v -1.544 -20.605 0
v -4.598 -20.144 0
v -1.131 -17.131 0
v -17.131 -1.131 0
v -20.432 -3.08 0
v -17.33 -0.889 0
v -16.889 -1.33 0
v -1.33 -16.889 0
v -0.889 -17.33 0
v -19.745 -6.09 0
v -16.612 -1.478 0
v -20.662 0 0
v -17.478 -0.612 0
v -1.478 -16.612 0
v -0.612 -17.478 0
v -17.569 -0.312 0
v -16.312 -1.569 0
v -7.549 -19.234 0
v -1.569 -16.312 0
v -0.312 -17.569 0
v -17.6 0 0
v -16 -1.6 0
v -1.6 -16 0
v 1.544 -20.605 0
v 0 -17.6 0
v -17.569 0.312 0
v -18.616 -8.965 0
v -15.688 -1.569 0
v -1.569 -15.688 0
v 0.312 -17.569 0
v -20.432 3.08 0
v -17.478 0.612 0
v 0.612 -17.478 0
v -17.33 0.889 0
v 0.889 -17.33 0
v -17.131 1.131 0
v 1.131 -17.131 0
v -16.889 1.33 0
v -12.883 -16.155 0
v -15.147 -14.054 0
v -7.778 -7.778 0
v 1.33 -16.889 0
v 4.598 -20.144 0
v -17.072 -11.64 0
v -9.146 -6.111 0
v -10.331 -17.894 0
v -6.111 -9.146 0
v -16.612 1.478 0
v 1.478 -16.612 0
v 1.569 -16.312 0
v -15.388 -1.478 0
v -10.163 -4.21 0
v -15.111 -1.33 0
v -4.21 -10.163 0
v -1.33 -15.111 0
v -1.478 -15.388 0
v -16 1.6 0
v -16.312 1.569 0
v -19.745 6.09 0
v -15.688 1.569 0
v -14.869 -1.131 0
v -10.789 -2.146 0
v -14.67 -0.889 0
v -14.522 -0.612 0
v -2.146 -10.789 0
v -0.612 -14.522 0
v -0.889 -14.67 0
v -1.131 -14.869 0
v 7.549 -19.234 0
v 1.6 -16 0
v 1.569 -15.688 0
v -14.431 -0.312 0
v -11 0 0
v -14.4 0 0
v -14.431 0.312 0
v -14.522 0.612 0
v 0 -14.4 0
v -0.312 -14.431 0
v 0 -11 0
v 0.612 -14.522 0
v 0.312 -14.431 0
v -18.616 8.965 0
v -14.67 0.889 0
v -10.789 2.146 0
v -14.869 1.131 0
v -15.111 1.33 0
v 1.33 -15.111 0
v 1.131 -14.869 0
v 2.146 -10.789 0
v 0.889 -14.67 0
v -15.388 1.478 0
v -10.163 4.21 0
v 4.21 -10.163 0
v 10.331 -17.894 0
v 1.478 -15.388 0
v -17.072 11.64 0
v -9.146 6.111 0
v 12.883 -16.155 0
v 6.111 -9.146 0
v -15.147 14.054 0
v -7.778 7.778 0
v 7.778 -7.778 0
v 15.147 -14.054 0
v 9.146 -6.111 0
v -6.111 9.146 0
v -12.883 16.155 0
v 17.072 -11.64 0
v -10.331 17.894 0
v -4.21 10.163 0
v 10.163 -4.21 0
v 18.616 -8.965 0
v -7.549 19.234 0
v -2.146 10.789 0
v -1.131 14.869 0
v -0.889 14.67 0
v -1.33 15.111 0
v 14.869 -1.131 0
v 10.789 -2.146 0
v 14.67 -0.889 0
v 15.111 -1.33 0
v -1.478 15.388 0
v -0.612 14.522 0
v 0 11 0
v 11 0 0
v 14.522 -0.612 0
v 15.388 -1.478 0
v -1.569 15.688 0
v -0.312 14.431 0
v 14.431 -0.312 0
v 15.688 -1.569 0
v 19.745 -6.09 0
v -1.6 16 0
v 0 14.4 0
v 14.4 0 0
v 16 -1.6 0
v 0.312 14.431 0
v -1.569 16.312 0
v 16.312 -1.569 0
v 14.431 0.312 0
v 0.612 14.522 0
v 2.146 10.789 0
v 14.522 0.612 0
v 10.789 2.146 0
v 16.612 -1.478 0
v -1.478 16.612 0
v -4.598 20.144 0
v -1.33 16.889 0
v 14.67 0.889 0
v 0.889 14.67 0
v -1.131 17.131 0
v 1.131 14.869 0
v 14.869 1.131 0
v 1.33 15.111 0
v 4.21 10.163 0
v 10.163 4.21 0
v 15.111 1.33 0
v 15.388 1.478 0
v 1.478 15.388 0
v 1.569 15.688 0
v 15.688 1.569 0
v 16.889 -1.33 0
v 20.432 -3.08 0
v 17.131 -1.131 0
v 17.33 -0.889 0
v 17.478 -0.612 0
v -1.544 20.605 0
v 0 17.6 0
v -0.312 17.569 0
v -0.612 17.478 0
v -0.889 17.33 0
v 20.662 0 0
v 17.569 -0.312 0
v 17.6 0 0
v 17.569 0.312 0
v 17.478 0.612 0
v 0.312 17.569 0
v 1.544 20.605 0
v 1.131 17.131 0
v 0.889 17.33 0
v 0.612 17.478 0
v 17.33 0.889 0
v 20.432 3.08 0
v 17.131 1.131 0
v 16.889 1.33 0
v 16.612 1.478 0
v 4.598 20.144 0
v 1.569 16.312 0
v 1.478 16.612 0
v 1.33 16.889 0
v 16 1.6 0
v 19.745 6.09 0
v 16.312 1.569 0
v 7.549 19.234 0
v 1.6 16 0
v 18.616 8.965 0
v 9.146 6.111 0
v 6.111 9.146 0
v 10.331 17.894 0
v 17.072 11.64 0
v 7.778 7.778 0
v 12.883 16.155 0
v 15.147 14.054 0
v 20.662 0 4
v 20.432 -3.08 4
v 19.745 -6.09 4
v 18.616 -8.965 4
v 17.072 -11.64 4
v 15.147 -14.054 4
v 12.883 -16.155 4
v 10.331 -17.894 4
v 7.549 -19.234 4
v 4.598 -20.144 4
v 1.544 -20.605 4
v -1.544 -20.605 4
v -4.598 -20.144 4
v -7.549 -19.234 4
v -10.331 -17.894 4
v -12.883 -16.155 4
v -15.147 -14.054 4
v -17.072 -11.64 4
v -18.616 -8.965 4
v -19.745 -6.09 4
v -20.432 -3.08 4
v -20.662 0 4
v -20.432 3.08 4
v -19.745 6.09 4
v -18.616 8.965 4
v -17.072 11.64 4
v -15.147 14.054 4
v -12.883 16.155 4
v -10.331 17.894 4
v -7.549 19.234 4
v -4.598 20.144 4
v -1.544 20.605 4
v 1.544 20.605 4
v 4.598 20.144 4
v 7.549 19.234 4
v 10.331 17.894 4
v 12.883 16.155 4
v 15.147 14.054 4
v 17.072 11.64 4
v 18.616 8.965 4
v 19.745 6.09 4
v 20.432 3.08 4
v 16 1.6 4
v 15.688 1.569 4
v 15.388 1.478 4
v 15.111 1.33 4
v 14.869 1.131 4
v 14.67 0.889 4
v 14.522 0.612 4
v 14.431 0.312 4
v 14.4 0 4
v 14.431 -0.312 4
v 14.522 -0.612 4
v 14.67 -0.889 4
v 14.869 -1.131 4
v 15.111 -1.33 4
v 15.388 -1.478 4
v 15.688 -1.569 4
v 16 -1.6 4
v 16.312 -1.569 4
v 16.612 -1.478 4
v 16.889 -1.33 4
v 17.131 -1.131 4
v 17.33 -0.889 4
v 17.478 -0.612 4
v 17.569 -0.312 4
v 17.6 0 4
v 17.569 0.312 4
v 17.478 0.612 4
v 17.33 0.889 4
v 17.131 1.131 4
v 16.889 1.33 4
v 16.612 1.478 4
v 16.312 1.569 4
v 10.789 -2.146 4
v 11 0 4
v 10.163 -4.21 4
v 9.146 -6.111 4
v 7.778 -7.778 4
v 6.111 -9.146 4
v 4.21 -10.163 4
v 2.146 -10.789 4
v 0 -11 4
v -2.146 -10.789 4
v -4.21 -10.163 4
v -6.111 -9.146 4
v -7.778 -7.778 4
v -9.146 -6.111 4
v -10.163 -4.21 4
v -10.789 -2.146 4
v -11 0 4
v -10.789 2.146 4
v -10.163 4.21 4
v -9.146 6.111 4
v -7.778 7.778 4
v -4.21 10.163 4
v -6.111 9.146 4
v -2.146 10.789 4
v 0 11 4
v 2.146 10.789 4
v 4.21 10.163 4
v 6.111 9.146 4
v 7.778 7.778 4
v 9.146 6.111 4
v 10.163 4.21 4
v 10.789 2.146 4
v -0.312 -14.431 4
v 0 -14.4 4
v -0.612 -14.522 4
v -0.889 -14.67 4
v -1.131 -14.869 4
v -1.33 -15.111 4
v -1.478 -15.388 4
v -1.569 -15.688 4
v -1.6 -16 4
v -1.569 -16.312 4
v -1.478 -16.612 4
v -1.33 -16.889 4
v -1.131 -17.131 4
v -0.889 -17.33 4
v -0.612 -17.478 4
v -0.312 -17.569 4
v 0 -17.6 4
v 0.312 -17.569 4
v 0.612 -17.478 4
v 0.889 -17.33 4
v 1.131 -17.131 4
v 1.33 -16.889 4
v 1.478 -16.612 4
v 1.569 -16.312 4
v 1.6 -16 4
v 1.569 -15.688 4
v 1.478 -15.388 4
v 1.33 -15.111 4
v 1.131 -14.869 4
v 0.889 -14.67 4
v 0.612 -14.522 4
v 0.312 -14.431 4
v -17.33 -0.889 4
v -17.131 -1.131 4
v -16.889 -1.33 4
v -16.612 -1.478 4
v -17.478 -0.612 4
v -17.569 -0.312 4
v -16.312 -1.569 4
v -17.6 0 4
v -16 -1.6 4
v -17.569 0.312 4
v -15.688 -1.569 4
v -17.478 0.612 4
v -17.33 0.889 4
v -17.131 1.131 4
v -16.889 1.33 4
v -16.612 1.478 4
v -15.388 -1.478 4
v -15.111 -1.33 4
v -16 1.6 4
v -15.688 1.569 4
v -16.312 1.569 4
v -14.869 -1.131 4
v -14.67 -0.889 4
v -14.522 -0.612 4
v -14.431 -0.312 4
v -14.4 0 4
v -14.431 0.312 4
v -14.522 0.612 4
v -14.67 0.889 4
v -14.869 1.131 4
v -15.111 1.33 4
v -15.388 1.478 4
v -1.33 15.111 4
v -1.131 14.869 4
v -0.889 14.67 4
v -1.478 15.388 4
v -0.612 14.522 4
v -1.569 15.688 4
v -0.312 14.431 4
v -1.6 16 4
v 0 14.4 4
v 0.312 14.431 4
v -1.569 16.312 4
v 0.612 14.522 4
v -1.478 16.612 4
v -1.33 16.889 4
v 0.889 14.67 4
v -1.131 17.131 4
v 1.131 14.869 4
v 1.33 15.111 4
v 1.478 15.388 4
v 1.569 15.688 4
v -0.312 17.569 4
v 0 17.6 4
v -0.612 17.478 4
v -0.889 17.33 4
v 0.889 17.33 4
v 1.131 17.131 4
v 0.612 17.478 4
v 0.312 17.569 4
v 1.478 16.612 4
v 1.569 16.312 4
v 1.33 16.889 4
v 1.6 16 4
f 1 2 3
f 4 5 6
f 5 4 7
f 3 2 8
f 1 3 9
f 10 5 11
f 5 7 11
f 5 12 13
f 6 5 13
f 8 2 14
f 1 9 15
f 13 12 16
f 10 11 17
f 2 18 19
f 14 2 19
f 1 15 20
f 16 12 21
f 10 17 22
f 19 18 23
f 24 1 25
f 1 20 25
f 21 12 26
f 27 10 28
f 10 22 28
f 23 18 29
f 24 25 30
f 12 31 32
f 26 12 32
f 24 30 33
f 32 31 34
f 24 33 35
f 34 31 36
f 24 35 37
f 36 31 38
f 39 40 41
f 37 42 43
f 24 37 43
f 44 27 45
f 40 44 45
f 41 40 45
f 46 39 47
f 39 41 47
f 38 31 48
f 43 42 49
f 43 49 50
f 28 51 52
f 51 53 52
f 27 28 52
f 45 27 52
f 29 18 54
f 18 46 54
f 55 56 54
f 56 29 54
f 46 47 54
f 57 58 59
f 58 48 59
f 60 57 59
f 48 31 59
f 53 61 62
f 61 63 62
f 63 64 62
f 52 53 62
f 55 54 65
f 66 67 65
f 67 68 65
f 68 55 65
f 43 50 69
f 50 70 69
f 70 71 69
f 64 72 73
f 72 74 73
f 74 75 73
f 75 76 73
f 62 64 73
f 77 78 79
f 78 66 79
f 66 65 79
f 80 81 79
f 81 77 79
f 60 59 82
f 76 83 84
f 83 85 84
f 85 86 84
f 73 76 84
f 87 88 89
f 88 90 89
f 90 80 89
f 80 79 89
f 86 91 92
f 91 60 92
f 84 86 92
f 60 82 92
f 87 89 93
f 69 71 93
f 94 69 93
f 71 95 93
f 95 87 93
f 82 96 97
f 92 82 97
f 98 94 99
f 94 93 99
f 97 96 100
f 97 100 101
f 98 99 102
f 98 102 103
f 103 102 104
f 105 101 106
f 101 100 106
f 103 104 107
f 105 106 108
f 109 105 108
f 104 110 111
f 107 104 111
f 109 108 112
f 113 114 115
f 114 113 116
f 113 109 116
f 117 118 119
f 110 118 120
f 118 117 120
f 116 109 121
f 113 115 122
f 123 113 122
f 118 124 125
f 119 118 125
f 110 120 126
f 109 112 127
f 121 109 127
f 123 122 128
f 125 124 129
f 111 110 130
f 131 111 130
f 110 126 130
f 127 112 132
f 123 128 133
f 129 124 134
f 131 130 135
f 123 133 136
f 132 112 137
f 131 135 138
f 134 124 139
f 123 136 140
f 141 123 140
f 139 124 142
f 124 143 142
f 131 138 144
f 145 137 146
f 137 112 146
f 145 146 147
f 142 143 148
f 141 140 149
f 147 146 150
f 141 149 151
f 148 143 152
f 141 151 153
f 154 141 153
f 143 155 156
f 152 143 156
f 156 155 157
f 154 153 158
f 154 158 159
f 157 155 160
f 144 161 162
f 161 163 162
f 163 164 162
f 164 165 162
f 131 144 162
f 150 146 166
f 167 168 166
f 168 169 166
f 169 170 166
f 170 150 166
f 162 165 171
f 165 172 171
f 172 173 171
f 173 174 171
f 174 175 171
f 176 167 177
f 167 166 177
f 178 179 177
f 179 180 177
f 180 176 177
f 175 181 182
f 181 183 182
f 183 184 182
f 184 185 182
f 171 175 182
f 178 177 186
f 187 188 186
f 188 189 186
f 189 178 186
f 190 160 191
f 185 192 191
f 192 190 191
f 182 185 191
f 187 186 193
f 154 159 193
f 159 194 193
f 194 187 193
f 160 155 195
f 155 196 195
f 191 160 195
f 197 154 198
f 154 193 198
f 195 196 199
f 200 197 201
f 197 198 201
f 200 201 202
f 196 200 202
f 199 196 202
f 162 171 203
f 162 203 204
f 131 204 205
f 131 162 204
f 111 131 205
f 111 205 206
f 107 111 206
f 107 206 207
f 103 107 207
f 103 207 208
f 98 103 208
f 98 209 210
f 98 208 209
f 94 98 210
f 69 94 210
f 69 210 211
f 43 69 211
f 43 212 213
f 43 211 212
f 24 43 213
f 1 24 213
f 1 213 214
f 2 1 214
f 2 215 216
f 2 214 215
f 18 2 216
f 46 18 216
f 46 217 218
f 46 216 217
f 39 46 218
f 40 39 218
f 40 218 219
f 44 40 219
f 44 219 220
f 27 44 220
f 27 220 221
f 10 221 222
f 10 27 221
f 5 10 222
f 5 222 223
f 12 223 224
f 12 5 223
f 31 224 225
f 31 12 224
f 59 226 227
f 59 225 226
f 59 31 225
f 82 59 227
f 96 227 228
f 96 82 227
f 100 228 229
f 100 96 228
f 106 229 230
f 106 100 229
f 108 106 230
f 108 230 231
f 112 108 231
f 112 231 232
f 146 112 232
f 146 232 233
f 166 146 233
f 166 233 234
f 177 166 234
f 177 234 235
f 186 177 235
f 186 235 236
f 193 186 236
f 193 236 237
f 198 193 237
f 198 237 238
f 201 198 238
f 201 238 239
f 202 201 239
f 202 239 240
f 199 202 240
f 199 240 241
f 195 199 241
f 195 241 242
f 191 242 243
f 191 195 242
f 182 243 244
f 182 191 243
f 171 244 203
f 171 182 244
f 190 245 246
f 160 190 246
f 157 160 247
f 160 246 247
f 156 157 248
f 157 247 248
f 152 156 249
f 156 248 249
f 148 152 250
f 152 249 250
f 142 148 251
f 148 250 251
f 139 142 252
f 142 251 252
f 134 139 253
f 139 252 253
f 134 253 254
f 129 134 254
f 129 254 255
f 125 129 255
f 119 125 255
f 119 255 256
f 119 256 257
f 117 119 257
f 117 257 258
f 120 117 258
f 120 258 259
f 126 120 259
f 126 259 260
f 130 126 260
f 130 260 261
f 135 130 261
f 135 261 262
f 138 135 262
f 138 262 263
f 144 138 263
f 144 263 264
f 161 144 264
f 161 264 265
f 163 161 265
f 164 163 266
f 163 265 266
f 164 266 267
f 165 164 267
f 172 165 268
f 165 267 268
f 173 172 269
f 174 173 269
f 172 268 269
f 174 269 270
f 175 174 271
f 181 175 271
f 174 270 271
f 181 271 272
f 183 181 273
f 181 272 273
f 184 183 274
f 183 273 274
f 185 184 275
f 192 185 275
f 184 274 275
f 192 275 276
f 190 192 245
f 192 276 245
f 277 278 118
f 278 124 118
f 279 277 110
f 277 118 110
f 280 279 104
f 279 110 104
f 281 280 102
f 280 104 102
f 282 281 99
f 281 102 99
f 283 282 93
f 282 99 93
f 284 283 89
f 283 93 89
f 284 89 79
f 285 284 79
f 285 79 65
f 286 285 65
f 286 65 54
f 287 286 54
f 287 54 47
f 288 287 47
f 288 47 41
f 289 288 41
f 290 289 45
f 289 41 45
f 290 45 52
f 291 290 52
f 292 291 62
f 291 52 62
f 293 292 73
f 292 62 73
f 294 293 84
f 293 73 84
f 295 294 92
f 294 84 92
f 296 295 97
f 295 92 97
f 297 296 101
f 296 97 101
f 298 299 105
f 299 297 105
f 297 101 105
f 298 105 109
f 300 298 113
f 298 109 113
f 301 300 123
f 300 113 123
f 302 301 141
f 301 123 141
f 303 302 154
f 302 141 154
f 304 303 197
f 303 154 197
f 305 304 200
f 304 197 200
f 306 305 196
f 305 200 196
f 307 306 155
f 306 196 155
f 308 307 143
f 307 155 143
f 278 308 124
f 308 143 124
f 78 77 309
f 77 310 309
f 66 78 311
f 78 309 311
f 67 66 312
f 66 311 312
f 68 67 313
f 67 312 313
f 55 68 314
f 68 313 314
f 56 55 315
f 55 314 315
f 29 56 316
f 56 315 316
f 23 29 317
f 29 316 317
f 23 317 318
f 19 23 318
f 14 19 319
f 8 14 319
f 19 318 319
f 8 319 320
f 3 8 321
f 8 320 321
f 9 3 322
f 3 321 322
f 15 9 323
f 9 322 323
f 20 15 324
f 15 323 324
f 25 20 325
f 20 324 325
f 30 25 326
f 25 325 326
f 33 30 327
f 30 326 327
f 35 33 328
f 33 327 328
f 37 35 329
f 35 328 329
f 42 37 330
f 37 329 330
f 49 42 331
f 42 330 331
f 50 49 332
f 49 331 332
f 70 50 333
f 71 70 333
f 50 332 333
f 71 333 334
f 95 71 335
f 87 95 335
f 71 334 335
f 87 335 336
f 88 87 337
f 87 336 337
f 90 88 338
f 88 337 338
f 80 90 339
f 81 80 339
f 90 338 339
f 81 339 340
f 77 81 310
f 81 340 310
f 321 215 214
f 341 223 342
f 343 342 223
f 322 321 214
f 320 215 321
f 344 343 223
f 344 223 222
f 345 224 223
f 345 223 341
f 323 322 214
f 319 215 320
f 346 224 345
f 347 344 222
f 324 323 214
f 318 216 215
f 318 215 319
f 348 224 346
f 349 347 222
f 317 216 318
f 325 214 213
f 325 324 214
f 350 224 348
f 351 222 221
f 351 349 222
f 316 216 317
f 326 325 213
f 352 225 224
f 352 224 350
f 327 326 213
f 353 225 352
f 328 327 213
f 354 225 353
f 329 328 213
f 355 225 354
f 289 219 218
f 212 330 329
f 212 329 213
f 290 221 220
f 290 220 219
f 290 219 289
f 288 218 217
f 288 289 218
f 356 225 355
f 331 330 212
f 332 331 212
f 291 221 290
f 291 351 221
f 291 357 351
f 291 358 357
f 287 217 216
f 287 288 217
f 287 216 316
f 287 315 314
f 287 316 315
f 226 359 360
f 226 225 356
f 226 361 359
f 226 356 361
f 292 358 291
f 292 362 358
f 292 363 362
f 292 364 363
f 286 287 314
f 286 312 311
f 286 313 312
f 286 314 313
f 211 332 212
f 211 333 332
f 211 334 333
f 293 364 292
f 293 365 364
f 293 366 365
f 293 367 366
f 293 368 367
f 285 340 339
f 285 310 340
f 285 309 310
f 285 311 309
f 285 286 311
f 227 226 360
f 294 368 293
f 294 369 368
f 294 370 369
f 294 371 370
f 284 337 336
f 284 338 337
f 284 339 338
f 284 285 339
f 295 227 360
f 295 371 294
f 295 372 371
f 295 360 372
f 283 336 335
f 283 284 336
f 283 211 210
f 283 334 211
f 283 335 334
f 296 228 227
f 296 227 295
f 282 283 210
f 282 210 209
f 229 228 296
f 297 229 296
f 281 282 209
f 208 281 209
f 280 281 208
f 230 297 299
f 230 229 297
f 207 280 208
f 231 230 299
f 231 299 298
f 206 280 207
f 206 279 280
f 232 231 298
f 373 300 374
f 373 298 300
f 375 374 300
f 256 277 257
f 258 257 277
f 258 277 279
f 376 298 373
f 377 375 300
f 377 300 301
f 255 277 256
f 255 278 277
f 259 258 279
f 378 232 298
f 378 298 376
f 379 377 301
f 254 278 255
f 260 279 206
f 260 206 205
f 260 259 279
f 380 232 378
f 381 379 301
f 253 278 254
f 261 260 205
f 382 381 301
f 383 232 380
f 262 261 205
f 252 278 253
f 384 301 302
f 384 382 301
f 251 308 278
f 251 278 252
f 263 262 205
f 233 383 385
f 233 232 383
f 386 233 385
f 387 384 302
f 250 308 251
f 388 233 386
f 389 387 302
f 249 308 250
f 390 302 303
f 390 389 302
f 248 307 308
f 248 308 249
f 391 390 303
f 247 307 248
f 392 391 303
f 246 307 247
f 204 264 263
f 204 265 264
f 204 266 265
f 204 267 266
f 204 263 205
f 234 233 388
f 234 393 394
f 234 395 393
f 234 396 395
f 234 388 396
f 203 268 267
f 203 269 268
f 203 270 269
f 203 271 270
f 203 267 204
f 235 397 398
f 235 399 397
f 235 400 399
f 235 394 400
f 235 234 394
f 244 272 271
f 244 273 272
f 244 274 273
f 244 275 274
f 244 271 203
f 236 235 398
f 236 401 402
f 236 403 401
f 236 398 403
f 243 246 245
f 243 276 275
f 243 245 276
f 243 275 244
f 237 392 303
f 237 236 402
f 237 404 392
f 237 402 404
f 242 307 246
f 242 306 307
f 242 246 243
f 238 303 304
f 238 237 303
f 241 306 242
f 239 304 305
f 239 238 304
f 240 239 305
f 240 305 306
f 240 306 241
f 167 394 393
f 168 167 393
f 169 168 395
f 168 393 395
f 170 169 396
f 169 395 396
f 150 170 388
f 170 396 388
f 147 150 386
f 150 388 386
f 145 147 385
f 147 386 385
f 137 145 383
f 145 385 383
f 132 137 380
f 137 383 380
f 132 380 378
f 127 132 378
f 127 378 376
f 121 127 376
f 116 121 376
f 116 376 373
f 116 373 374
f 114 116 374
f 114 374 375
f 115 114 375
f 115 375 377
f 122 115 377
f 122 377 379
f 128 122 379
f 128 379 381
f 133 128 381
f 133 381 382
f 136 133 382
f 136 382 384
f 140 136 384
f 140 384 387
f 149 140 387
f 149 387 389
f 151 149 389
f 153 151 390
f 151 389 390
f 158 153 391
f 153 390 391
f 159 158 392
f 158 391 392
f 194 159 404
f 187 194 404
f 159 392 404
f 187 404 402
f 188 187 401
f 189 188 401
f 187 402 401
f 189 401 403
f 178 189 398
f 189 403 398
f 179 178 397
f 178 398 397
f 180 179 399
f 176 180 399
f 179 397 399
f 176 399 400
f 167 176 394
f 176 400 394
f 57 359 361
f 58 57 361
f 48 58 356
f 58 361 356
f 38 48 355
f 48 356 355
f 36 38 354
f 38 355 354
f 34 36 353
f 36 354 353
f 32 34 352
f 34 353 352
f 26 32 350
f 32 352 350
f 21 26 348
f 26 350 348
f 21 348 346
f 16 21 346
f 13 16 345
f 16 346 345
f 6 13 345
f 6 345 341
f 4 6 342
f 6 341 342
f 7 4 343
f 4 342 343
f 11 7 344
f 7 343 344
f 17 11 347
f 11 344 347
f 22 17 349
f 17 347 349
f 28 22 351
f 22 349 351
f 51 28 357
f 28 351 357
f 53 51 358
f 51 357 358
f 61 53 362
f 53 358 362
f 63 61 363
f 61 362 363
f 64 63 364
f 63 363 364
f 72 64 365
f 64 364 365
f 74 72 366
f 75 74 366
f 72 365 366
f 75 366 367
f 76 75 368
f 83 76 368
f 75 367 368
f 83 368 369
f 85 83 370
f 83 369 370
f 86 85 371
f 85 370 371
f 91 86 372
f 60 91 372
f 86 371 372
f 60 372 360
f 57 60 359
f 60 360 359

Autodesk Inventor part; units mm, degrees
ref_plane "YZ Plane" through (0, 0, 0) normal (1, 0, 0) x (0, 1, 0)
ref_plane "XZ Plane" through (0, 0, 0) normal (0, 1, 0) x (-1, 0, 0)
ref_plane "XY Plane" through (0, 0, 0) normal (0, 0, 1) x (1, 0, 0)
sketch "Sketch1" plane through (0, 0, 0) normal (0, 0, 1) x (1, 0, 0)
  circle A0 centre (0, 0) radius 11
  circle A1 centre (0, 0) radius 20.6625
  point P0 (16, 0)
  point P1 (0, 16)
  point P2 (-16, 0)
  point P3 (0, -16)
  dimension "d0" = 22
  dimension "d2" = 16
  dimension "d5" = 360
  dimension "d7" = 41.325
extrude "Plate1" add sketch "Sketch1" along normal blind 4
hole "Hole1" at (16, 0, 0) at (0, 16, 0) at (-16, 0, 0) at (0, -16, 0) direction (0, 0, 1) diameter 3.2 end through all clearance for "Countersunk Flat Head Screw ISO 2009/7046" size "M3" standard "ISO"
equation "\"d14\" = Thickness"
equation "\"d8\" = Thickness"
equation "\"BendRadius\" = Thickness"
equation "\"BendReliefWidth\" = Thickness"
equation "\"BendReliefDepth\" = 0.5 * Thickness"
equation "\"CornerReliefSize\" = 4 * Thickness"
equation "\"MinimumRemnant\" = 2 * Thickness"
equation "\"TransitionRadius\" = BendRadius"
equation "\"JacobiRadiusSize\" = BendRadius"
equation "\"GapSize\" = Thickness"
equation "\"Thickness\" = 4"
properties part number "spacer 4 mm" material "Aluminum 6061"
